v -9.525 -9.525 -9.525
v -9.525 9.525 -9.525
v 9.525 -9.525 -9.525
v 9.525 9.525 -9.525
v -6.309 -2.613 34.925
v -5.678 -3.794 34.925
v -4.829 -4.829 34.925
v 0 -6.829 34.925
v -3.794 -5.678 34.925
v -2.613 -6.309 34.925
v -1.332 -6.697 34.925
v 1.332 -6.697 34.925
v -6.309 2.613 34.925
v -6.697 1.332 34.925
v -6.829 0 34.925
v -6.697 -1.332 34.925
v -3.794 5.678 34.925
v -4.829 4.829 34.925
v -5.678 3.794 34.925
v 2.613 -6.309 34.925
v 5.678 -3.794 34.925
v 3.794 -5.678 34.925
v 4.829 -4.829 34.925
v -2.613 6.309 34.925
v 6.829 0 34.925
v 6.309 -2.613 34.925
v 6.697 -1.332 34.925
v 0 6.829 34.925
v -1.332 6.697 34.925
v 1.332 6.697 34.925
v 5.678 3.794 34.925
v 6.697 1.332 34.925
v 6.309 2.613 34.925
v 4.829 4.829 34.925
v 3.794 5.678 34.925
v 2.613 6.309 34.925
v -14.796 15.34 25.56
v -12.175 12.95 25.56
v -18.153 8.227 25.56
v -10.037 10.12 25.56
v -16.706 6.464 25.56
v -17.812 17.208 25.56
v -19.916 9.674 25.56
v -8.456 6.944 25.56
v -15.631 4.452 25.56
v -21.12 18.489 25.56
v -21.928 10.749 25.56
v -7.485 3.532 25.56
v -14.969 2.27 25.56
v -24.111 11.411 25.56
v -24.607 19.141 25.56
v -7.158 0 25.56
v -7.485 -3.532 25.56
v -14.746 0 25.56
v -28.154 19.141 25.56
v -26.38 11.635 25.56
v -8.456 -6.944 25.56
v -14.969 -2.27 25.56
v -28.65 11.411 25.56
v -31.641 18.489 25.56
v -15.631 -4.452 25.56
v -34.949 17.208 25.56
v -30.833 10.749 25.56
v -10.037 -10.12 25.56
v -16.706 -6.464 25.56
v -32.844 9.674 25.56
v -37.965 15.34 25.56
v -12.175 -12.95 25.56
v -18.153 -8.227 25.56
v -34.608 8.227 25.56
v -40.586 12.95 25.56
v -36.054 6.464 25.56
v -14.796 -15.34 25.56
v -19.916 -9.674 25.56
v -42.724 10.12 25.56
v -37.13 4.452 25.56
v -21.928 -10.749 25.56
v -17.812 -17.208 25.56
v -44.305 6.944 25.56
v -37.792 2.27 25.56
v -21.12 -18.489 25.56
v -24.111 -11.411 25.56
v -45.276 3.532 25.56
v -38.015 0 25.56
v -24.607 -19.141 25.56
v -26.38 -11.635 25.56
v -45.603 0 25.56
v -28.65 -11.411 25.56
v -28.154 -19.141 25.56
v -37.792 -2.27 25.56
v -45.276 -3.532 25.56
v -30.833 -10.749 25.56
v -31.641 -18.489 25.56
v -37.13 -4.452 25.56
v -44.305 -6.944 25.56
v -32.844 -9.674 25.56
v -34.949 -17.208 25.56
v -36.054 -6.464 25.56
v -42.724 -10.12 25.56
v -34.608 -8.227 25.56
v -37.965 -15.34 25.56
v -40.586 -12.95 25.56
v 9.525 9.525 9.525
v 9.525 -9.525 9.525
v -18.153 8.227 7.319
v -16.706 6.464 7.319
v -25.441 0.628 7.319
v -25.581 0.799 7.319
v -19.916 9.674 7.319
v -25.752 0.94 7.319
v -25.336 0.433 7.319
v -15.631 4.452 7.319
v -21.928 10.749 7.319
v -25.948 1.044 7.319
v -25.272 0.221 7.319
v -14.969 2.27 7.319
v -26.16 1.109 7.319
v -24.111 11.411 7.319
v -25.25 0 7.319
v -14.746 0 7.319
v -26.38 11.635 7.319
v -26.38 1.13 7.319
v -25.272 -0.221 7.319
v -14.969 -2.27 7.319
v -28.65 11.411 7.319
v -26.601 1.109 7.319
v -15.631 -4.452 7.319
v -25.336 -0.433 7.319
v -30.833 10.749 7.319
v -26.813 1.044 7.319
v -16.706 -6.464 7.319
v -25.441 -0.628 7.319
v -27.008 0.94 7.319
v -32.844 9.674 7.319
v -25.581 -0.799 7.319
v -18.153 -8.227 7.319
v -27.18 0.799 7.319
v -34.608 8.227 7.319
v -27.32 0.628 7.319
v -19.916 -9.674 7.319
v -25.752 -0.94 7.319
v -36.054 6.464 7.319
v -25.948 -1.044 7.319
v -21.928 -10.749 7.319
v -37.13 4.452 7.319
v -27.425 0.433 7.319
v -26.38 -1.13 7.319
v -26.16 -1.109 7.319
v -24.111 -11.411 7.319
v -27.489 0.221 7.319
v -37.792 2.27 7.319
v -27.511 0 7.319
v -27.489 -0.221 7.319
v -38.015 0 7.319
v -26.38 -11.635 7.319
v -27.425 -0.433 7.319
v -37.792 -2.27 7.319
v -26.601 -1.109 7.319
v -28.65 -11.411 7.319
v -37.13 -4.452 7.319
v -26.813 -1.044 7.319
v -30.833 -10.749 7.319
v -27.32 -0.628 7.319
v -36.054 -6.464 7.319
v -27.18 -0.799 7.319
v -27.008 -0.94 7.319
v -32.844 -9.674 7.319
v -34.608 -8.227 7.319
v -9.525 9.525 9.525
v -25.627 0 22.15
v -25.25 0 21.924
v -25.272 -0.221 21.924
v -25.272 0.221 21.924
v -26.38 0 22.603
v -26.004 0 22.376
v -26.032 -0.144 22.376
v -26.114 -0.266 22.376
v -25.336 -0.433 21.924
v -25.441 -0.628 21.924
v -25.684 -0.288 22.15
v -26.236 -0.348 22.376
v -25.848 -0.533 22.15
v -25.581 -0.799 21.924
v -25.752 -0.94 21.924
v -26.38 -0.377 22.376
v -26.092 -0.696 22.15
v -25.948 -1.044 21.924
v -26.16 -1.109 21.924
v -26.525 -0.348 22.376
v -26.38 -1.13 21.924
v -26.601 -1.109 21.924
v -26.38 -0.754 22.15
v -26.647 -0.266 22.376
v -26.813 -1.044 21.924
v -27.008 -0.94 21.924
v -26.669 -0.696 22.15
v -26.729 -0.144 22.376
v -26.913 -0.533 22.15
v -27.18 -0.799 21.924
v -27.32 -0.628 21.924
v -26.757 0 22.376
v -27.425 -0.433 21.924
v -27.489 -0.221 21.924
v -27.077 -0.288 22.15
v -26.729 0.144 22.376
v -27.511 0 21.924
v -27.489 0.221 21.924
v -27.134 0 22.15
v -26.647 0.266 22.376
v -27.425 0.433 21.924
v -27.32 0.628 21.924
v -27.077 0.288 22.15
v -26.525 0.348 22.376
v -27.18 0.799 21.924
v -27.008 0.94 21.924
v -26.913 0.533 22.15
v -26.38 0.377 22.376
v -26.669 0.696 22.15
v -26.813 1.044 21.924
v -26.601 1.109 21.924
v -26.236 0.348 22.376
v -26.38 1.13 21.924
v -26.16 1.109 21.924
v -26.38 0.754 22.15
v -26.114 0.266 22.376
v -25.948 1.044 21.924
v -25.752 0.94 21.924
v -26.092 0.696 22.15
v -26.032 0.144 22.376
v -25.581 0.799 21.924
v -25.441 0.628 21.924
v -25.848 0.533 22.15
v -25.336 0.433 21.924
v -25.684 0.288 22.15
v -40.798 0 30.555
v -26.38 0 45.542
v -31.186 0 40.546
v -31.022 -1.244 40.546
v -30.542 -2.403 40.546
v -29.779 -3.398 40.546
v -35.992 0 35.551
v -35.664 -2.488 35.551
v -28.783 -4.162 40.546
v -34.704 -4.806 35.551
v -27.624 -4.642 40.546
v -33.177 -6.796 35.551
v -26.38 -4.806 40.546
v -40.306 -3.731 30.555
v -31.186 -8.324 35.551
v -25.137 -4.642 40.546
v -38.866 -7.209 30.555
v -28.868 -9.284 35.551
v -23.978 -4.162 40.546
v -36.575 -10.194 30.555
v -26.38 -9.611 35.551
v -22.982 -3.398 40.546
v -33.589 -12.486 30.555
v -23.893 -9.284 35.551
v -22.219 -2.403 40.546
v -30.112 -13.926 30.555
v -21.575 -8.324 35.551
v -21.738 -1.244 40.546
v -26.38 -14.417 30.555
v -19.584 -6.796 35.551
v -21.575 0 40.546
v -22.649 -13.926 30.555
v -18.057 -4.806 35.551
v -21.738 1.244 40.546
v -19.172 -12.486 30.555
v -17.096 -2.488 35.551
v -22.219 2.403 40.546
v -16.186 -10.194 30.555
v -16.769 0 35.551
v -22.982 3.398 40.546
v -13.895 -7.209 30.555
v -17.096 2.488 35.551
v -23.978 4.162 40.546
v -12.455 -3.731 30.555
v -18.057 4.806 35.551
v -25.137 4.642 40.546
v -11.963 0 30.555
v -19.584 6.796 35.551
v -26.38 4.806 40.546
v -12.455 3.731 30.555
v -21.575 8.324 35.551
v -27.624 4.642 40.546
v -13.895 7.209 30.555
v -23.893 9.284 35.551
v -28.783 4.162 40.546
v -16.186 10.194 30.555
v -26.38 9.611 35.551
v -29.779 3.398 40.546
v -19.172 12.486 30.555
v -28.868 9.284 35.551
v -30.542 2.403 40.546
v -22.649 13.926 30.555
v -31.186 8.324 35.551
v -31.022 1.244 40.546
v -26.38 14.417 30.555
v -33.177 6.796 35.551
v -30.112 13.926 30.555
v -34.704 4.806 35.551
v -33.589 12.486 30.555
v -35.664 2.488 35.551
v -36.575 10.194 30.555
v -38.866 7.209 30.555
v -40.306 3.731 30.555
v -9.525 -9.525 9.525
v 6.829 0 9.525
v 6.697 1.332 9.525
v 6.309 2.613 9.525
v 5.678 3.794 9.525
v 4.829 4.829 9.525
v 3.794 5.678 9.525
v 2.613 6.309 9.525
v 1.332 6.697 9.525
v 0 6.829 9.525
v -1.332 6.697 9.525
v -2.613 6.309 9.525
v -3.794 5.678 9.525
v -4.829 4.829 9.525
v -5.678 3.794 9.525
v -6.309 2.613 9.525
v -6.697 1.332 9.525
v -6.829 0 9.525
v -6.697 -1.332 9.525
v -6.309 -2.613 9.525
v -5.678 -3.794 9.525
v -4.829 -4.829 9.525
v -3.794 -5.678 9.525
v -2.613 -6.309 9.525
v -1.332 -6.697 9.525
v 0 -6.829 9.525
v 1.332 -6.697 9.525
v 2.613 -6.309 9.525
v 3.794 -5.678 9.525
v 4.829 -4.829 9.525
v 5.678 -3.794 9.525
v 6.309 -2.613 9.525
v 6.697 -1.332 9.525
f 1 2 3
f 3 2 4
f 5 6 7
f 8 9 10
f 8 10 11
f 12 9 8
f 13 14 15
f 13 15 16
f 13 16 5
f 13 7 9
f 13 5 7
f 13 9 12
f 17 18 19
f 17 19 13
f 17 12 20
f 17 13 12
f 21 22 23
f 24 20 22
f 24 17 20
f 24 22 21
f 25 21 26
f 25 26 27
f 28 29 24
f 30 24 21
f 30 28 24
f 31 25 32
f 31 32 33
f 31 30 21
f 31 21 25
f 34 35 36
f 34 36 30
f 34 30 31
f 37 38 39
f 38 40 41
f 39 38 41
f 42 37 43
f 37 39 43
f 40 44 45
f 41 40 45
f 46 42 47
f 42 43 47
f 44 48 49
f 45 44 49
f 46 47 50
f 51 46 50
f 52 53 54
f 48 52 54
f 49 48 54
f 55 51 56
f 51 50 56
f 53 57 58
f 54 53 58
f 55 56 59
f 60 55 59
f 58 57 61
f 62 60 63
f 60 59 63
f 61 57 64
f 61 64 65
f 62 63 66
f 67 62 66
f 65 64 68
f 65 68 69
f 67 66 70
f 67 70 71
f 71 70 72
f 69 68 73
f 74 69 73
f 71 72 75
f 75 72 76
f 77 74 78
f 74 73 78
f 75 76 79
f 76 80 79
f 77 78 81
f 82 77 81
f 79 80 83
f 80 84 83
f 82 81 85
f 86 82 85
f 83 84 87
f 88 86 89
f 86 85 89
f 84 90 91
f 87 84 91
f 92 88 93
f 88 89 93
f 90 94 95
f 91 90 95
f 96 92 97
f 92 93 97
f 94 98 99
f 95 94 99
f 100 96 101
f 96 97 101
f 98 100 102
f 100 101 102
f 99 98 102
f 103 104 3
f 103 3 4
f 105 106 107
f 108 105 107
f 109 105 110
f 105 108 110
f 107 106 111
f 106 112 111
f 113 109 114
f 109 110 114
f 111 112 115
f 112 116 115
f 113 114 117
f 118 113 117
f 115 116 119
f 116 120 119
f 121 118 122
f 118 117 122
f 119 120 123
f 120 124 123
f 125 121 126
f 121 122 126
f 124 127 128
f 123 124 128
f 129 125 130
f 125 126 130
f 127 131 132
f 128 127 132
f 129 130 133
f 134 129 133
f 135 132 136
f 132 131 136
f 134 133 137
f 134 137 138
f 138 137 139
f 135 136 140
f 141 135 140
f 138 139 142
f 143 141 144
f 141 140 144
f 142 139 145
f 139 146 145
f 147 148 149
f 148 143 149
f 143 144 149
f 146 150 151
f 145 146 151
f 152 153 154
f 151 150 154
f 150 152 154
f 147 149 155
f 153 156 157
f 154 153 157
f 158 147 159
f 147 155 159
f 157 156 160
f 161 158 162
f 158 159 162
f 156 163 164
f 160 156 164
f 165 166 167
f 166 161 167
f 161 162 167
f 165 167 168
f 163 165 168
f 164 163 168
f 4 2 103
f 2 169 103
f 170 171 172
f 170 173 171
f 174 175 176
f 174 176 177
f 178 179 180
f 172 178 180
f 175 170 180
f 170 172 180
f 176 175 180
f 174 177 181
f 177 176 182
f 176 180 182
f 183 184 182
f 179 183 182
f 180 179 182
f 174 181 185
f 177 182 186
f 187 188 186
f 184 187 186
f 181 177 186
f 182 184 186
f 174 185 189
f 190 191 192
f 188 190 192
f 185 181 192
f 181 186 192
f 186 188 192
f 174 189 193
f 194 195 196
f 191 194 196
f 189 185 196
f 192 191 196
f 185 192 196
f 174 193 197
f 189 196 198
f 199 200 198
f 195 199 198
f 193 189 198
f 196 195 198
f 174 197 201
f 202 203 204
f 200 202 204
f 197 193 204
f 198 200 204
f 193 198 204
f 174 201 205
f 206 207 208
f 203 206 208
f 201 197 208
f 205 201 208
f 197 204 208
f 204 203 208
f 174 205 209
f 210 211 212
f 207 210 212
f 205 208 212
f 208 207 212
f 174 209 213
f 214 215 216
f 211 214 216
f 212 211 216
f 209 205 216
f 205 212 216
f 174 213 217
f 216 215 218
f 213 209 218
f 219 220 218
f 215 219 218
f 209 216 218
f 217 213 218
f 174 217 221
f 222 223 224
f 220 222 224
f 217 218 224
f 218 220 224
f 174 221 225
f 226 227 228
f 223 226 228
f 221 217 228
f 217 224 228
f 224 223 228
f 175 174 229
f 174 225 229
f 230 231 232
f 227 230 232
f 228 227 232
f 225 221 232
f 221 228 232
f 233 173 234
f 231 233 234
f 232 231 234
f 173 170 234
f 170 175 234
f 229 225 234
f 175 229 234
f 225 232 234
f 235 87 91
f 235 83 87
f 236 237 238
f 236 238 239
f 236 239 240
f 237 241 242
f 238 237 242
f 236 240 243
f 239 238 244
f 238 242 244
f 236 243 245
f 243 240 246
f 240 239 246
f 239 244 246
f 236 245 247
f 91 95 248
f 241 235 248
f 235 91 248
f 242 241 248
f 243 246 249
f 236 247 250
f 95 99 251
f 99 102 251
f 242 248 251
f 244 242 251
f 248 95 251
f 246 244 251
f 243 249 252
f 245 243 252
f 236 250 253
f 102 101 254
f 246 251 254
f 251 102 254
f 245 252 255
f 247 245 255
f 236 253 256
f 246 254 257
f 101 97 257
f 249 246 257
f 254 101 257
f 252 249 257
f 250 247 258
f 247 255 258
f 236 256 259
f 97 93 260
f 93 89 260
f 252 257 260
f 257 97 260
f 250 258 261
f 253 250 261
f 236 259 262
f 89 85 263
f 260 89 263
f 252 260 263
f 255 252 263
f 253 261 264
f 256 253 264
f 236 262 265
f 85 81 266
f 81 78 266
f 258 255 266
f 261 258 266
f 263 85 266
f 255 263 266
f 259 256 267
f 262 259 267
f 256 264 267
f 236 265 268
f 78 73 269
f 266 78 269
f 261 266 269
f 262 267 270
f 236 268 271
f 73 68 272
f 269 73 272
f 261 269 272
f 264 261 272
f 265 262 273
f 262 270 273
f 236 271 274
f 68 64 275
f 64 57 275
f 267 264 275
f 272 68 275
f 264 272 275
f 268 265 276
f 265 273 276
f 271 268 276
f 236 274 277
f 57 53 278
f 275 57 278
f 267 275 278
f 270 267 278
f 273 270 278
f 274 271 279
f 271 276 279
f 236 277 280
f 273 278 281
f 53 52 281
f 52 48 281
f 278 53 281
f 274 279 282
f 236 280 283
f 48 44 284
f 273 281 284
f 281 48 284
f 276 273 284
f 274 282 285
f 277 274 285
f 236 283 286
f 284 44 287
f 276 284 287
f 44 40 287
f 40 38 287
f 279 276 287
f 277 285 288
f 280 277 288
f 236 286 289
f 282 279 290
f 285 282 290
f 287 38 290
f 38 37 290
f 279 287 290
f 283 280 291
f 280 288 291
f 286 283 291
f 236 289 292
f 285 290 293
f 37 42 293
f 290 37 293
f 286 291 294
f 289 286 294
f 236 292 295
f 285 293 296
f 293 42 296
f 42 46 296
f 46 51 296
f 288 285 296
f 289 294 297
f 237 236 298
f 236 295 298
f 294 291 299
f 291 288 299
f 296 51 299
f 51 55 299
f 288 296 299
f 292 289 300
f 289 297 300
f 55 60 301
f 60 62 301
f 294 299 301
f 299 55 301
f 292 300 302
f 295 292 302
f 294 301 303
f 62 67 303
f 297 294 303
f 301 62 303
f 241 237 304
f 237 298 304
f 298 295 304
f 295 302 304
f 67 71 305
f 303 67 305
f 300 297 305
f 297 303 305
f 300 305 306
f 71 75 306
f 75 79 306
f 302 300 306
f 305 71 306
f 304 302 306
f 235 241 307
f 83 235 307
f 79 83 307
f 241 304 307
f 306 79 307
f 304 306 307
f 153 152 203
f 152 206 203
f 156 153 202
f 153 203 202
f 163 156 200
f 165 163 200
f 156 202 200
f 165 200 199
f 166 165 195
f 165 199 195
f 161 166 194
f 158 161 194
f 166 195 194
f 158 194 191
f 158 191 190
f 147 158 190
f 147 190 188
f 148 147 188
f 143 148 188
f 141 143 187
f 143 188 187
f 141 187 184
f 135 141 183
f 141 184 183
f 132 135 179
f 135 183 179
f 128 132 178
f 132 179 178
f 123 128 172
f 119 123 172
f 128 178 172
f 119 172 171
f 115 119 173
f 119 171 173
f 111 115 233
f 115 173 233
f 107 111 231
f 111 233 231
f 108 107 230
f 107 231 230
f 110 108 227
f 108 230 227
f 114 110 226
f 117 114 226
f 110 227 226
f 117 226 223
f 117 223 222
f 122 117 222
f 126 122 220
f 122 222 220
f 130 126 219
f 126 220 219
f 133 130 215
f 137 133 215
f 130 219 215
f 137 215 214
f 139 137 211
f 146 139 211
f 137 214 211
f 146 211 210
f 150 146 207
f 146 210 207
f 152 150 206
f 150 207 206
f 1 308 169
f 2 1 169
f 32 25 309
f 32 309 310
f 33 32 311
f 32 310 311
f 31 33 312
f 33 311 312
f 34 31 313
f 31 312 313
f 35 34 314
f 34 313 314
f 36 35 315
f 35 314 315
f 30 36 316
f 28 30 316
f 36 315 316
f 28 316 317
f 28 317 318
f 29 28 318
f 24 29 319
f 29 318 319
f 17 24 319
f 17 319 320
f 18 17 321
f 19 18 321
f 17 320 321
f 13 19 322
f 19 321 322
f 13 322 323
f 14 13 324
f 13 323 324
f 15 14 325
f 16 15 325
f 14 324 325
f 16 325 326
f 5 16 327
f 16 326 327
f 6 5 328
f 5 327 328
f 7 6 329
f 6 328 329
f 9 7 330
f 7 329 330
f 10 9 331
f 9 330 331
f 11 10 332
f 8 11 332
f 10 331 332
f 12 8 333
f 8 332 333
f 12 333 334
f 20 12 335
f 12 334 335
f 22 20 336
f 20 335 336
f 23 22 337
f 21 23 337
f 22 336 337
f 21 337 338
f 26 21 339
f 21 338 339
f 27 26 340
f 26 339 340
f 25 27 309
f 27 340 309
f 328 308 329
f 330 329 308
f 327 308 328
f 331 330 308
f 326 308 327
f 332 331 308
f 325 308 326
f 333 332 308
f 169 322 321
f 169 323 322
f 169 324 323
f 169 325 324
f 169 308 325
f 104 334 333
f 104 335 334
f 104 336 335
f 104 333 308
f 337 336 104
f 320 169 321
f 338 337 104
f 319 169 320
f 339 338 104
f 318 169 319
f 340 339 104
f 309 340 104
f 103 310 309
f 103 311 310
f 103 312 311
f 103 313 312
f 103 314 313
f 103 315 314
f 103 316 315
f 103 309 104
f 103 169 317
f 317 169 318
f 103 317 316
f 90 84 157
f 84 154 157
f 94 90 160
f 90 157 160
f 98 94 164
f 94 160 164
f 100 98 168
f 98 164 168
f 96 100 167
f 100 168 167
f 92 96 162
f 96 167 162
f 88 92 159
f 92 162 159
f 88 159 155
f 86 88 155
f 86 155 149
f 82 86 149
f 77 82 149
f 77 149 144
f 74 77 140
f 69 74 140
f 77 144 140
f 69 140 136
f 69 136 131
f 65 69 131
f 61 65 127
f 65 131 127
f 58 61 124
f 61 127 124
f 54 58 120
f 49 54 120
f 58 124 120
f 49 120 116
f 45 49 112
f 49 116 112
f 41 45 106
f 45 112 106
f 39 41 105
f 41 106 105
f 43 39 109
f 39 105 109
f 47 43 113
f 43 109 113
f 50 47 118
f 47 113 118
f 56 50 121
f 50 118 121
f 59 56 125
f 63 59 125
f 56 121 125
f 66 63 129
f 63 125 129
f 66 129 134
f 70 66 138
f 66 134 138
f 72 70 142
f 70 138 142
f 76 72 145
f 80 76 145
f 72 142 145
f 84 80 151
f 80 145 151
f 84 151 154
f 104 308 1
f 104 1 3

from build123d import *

# Parameters (mm, degrees)
F0_W     = 19.05
F0_H     = 19.05
F1_DEPTH = 9.525
F2_R     = 6.8287067213
F3_DEPTH = 25.4
F7_D     = 2.2606
F7_DEPTH = 14.605
F7_TIP   = 0.6791527577


with BuildPart() as f1:
    # F0 (on Top) → F1 (new body, symmetric)
    with BuildSketch(Plane.XY):
        Rectangle(F0_W, F0_H)
    extrude(amount=F1_DEPTH, both=True)

    # F2 (on face) → F3 (join)
    with BuildSketch(Plane.XY.offset(9.525)):
        Circle(F2_R)
    extrude(amount=F3_DEPTH)


with BuildPart() as f5:
    # F4 (on Front) → F5 (revolve)
    with BuildSketch(Plane.XZ):
        Polygon((-26.3804178685, 7.318645176), (-26.3804178685, 45.5416366458), (-45.6033088267, 25.559945032), (-38.0153283477, 25.559945032), (-38.0153283477, 7.318645176), align=None)
    revolve(axis=Axis((-26.3804178685, 0, 26.4301409109), (0, 0, 1)))

    # F7
    with Locations(Plane(origin=(0, 0, 7.318645176), x_dir=(1, 0, 0), z_dir=(0, 0, -1))):
        with Locations((-26.3804178685, 0)):
            Hole(F7_D / 2, depth=F7_DEPTH)
            with Locations((0, 0, -(F7_DEPTH + F7_TIP / 2))):  # 118° drill point
                Cone(0, F7_D / 2, F7_TIP, mode=Mode.SUBTRACT)


solid = Compound([f1.part, f5.part])
